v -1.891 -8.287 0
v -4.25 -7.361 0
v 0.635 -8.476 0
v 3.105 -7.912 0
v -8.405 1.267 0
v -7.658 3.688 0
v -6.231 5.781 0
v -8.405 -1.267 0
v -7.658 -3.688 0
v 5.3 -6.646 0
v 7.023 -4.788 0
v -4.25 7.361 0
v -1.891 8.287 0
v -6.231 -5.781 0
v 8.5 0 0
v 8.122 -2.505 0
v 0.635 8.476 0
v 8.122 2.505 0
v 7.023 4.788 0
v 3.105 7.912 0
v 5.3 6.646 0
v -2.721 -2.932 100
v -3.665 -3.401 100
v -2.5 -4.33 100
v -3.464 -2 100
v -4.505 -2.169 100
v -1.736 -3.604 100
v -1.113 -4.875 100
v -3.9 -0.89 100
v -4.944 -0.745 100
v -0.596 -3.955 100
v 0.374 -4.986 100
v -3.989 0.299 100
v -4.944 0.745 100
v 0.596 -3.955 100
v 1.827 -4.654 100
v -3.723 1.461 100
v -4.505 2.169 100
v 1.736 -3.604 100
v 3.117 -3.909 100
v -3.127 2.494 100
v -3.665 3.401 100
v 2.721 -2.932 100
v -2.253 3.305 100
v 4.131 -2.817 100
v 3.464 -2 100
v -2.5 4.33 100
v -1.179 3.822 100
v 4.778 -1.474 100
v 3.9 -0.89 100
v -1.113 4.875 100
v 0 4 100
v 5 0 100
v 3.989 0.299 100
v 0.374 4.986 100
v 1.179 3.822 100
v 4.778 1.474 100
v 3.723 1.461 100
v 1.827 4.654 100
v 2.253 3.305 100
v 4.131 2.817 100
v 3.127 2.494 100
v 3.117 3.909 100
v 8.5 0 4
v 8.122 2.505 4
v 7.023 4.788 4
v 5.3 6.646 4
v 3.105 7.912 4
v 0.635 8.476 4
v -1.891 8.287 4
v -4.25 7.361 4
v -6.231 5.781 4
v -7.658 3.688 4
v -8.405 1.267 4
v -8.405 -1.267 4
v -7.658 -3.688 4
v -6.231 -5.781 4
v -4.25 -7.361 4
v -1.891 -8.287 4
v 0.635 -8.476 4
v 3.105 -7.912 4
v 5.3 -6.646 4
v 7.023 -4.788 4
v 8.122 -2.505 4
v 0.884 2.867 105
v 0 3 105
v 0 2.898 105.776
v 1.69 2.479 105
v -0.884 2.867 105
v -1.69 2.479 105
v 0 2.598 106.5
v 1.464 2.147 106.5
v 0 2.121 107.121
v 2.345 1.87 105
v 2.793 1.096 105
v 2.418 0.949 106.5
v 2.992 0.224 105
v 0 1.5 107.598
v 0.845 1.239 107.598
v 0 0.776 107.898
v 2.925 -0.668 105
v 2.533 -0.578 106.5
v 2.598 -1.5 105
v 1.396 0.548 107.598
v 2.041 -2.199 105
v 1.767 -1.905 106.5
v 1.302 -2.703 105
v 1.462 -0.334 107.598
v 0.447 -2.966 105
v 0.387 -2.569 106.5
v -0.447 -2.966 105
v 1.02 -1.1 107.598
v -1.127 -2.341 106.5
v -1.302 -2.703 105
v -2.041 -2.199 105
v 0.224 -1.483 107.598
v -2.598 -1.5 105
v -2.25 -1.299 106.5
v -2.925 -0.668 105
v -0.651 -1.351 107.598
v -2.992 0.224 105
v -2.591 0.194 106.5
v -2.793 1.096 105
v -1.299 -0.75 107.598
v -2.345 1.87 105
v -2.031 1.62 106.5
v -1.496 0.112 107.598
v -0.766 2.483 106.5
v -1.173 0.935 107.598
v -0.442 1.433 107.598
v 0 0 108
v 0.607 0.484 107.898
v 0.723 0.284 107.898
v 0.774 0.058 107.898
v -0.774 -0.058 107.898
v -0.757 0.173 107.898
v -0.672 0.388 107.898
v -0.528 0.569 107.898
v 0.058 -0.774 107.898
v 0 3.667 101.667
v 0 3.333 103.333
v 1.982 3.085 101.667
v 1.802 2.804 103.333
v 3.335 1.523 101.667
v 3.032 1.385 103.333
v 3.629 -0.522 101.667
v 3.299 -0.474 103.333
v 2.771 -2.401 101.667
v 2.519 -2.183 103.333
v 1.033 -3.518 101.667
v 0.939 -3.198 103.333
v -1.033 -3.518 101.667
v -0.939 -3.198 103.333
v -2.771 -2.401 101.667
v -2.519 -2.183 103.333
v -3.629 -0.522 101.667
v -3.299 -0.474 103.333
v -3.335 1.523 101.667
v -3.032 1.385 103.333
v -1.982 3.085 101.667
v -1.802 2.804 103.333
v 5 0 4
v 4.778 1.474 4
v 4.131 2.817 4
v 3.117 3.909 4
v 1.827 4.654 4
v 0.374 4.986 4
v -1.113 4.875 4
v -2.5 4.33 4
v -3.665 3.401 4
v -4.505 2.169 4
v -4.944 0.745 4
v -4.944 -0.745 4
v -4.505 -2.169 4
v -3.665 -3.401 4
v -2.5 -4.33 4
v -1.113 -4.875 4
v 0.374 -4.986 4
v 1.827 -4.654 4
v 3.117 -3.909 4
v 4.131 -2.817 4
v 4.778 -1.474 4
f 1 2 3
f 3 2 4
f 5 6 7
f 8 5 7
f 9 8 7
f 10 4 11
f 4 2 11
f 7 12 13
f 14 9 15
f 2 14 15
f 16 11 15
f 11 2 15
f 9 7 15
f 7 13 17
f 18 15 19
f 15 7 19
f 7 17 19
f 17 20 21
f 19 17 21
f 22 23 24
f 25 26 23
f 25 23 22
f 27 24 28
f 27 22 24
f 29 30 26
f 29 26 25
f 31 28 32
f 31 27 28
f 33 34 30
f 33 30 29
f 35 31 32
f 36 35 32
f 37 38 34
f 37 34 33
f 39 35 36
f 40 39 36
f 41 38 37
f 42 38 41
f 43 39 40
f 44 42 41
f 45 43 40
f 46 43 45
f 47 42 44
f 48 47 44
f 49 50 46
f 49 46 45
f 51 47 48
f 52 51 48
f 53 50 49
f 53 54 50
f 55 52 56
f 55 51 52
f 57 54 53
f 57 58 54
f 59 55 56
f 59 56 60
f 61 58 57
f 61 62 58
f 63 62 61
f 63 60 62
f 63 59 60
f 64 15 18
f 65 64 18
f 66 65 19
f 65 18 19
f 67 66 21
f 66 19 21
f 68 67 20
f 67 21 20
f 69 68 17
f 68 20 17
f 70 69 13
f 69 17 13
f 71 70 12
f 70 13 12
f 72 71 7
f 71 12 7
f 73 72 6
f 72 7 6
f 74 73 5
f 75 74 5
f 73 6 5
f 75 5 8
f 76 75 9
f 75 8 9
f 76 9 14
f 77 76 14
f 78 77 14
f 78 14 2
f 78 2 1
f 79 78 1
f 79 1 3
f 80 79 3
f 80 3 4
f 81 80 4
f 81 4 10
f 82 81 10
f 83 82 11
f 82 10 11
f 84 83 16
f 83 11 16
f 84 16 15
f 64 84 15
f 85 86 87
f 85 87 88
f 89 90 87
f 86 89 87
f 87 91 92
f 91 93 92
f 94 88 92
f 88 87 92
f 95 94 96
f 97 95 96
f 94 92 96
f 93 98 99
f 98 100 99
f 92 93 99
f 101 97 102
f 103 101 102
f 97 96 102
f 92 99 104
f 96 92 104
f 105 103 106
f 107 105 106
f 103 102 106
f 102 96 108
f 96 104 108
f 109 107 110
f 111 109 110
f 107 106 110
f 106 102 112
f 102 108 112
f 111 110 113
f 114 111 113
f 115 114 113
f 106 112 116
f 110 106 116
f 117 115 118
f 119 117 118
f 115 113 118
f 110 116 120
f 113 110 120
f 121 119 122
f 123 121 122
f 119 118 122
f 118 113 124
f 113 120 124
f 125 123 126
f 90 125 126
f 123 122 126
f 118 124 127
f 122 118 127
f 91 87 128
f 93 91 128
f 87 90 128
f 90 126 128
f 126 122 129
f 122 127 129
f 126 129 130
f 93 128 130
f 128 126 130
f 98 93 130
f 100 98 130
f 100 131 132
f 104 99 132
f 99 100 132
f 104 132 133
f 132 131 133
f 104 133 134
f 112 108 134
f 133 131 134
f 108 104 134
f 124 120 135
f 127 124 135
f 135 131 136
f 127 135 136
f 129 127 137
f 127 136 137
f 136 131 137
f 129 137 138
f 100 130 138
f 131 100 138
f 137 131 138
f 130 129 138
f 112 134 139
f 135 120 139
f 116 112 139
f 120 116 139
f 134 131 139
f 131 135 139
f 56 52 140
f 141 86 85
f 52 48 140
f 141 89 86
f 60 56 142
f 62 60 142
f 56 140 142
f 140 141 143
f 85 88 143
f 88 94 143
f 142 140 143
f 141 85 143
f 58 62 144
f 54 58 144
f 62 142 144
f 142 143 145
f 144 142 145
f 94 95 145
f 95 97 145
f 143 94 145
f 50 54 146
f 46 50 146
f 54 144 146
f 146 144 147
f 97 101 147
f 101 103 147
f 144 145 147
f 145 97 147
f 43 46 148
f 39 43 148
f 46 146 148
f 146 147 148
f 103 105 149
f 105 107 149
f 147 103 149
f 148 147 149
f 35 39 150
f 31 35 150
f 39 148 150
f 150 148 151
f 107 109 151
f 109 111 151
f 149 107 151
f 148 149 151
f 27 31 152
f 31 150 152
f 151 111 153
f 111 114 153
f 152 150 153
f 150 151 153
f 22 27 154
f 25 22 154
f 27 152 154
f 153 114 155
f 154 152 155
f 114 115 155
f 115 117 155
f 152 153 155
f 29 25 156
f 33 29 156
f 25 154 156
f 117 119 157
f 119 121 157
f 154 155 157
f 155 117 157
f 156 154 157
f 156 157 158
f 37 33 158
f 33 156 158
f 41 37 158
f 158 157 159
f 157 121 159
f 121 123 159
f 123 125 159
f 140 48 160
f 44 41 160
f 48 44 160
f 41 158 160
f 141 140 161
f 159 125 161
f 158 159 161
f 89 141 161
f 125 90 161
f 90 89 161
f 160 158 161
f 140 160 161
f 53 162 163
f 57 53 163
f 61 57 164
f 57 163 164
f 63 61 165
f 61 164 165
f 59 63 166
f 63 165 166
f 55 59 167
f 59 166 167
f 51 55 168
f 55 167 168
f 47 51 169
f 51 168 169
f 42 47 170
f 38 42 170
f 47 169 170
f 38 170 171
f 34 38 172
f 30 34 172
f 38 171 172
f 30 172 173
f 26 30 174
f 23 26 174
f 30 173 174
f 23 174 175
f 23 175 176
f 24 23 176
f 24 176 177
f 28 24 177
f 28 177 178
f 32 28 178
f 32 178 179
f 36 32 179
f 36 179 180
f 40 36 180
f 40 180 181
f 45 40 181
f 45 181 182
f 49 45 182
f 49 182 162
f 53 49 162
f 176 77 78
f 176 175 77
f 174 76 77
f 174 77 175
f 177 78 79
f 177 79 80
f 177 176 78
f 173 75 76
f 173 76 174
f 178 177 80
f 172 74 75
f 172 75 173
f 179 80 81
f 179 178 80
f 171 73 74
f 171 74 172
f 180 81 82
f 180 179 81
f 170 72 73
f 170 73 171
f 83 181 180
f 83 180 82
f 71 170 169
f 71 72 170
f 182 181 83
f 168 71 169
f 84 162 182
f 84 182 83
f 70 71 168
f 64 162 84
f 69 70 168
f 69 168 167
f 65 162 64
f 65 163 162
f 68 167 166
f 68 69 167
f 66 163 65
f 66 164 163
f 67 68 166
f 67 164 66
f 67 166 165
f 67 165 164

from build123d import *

# Parameters (mm, degrees)
F0_R     = 8.5
F1_DEPTH = 4
F2_R     = 5
F3_DEPTH = 100


with BuildPart() as f1:
    # F0 (on Top) → F1 (new body)
    with BuildSketch(Plane.XY):
        Circle(F0_R)
    extrude(amount=F1_DEPTH)

    # F2 (on Top) → F3 (join)
    with BuildSketch(Plane.XY):
        Circle(F2_R)
    extrude(amount=F3_DEPTH)

    # F4 (on Right) → F5 (revolve)
    with BuildSketch(Plane.YZ):
        Polygon((3, 105), (0, 105), (0, 100), (4, 100), align=None)
    revolve(axis=Axis((0, 0, 102.5), (0, 0, -1)))

    # F6 (on Right) → F7 (revolve)
    with BuildSketch(Plane.YZ):
        with BuildLine():
            ThreePointArc((3, 105), (2.12132, 107.12132), (0, 108))
            Line((0, 108), (0, 105))
            Line((0, 105), (3, 105))
        make_face()
    revolve(axis=Axis((0, 0, 106.5), (0, 0, -1)))


solid = f1.part
